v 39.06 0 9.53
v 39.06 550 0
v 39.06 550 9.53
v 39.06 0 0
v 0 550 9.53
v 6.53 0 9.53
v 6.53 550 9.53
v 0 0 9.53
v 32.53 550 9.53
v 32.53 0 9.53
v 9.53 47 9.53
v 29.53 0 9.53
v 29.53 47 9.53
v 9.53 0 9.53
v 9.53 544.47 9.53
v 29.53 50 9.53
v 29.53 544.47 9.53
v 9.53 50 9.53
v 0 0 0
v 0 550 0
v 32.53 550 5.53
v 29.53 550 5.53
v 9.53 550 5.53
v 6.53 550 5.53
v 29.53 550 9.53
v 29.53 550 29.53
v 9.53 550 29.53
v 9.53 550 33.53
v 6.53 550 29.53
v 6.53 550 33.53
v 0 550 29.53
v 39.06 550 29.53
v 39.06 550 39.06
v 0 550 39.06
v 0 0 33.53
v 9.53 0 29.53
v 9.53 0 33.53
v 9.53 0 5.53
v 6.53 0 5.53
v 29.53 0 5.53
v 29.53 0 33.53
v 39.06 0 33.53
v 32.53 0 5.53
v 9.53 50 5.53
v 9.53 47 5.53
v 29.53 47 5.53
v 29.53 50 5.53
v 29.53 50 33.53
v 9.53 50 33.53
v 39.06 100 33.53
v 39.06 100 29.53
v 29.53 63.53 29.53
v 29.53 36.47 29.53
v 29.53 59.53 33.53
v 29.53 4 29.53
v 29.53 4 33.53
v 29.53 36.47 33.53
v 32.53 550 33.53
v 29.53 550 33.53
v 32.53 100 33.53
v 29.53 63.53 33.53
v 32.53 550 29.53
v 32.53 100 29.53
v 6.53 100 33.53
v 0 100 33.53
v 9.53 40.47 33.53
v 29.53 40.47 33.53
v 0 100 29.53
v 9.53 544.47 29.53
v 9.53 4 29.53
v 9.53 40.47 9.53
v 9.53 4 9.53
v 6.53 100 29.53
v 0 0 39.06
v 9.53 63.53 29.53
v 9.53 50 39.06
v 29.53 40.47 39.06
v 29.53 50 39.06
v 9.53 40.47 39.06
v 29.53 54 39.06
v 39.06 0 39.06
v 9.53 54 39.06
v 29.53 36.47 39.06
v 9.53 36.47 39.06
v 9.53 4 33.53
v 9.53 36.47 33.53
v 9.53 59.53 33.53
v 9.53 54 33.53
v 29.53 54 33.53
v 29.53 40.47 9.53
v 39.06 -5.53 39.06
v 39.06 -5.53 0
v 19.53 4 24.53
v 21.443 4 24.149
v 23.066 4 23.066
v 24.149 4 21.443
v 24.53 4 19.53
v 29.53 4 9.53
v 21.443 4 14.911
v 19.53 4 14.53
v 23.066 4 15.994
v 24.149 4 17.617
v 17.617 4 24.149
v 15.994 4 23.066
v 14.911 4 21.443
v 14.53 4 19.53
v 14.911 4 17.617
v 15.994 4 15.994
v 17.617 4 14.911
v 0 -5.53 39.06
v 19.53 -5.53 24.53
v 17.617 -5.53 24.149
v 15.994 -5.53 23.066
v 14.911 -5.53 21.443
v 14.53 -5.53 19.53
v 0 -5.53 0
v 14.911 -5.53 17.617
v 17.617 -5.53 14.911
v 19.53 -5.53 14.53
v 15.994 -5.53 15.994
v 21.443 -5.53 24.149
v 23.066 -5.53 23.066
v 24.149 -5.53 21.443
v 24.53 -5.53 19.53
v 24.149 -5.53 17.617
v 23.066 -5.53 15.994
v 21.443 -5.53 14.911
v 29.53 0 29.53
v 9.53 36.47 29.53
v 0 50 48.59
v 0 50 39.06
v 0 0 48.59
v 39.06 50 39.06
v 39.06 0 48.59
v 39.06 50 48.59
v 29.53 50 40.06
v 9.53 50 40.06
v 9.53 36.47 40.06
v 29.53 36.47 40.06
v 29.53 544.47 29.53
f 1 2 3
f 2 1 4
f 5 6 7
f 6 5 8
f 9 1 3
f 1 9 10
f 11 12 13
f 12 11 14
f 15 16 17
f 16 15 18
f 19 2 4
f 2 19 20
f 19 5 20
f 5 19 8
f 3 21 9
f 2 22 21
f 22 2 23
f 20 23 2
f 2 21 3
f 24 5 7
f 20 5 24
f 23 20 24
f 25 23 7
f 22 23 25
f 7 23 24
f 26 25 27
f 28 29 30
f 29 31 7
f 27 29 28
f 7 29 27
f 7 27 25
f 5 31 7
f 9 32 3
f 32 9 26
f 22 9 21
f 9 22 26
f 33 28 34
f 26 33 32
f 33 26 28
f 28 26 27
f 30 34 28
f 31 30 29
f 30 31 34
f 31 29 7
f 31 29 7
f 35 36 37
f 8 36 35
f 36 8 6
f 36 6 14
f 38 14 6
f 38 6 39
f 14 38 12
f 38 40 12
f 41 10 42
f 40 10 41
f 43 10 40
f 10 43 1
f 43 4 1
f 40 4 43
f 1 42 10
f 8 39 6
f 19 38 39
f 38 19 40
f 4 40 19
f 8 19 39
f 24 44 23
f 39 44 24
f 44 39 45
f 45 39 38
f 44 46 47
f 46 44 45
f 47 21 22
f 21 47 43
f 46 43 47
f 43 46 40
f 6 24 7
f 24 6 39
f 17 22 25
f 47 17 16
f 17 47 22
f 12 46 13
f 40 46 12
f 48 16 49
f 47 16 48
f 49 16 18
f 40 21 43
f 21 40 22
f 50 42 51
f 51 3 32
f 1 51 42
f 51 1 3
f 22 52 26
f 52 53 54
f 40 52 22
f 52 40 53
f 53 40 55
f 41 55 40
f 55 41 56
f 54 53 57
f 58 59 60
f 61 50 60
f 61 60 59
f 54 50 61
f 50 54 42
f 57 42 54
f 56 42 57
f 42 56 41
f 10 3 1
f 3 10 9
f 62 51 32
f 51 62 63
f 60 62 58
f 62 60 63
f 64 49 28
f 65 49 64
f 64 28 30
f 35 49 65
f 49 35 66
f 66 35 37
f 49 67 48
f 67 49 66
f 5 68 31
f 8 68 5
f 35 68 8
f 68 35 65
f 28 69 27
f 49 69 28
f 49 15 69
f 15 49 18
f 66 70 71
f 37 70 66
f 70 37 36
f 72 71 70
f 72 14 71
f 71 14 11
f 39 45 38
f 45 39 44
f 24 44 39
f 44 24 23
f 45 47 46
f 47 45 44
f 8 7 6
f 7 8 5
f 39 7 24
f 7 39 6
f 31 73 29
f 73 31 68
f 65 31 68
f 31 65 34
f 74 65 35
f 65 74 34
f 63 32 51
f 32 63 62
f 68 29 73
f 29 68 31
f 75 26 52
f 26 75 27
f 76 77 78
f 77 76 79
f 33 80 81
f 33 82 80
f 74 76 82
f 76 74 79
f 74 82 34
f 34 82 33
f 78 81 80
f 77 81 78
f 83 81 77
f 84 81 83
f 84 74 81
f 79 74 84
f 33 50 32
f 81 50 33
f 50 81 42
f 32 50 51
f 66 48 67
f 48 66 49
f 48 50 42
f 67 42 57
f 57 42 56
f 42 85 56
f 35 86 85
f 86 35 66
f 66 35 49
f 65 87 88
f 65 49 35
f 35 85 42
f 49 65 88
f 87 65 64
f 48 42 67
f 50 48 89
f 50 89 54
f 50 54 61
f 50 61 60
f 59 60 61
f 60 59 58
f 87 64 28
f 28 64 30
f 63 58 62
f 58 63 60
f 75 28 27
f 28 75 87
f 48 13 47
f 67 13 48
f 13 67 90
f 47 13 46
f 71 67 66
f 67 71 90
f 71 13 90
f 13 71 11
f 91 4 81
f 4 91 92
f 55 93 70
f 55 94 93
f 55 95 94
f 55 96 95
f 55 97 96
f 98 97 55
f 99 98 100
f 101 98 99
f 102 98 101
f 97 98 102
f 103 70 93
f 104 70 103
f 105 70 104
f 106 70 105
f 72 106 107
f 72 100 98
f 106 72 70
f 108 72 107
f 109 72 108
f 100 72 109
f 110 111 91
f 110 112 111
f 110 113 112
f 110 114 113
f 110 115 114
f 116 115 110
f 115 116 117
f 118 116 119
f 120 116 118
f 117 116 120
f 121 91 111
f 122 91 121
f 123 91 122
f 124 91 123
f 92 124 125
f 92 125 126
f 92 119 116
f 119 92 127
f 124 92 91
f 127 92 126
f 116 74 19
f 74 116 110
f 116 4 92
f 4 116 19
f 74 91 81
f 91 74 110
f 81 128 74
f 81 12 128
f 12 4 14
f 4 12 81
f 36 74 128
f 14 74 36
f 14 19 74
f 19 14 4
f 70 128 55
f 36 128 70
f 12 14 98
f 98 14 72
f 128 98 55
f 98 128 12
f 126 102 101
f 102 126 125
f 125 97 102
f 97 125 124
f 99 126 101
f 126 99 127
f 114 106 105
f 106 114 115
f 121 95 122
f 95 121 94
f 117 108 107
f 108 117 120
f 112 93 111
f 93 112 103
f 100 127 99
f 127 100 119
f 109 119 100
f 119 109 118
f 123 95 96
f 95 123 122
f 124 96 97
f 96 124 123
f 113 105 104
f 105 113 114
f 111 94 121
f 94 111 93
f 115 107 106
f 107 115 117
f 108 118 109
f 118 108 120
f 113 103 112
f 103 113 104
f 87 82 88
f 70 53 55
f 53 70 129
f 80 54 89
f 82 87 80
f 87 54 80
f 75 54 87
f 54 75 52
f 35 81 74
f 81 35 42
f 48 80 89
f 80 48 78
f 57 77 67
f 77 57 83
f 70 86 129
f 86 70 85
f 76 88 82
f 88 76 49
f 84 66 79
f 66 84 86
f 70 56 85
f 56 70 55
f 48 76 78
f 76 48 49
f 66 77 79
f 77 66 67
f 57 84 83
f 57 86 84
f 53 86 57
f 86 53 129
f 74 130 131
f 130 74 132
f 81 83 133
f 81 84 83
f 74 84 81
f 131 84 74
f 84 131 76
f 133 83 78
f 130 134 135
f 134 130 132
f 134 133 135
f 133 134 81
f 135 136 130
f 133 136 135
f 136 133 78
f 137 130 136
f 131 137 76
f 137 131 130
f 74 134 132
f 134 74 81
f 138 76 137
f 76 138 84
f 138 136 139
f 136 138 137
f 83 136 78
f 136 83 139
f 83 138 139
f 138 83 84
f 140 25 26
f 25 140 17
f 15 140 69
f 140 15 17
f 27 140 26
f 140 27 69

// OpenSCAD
module pipe_side(stock_thickness=9.53,
                 inner_width=20,
                 pipe_length=500,
                 upper_lip_pipe_length = 50,
                 foot_cavity_height=50,
                 dado_width=3,
                 dado_depth=4,
                 right=false)
 {
    // TODO add screw holes?
    total_height = pipe_length+foot_cavity_height;
    difference() {
        translate([0, 0, 0])
            cube([inner_width+(2*dado_depth),
                  total_height,
                  stock_thickness]);
        translate([right?inner_width+dado_depth:0, 0, dado_width])
            cube([dado_depth,
                  total_height,
                  stock_thickness-dado_width]);
        translate([right?0:inner_width+dado_depth,
                   foot_cavity_height+upper_lip_pipe_length,
                   dado_width])
            cube([dado_depth,
                  total_height-upper_lip_pipe_length-foot_cavity_height,
                  stock_thickness-dado_width]);
    }
}

module pipe_back(stock_thickness=9.53,
                 inner_width=20,
                 pipe_length=500,
                 foot_cavity_height=50,
                 dado_width=3,
                 dado_depth=4)
{
    total_height = pipe_length+foot_cavity_height;
    difference() {
        translate([0, 0, 0])
            cube([inner_width+(2*stock_thickness),
                  total_height,
                  stock_thickness]);
        translate([stock_thickness-dado_width,
                   0,
                   stock_thickness-dado_depth])
            cube([dado_width,
                  total_height,
                  dado_depth]);
        translate([inner_width+stock_thickness,
                   0,
                   stock_thickness-dado_depth])
            cube([dado_width,
                  total_height,
                  dado_depth]);
        // languid dado
        translate([stock_thickness,
                   foot_cavity_height-dado_width,
                   stock_thickness-dado_depth])
            cube([inner_width, dado_width, dado_depth]);
    }
}

module pipe_front(stock_thickness=9.53,
                 inner_width=20,
                 pipe_length=500,
                 upper_lip_pipe_length = 50,
                 foot_cavity_height=50,
                 dado_width=3,
                 dado_depth=4)
{
    difference() {
        cube([inner_width+(2*stock_thickness),
              pipe_length-upper_lip_pipe_length,
              stock_thickness]);
        translate([stock_thickness-dado_width,
                   0,
                   stock_thickness-dado_depth])
            cube([dado_width,
                  pipe_length,
                  dado_depth]);
        translate([inner_width+stock_thickness,
                   0,
                   stock_thickness-dado_depth])
            cube([dado_width,
                  pipe_length,
                  dado_depth]);
    }
}

module languid(stock_thickness=9.53,
               inner_width=20,
               dado_width=3,
               dado_depth=4)
{
    difference() {
        cube([inner_width,
              inner_width+2*dado_depth,
              stock_thickness]);
        translate([0, 0, dado_width])
            cube([inner_width, dado_depth, stock_thickness-dado_width]);
    }
}

module foot_base(stock_thickness=9.53,
                 inner_width=20,
                 dado_depth=4,
                 foot_hole_dia=10)
{
    difference() {
        cube([inner_width+2*stock_thickness,
              inner_width+2*stock_thickness,
              stock_thickness]);
        translate([0, 0, stock_thickness-dado_depth])
            cube([inner_width+2*stock_thickness,
                  stock_thickness,
                  dado_depth]);
        translate([0, inner_width+stock_thickness, stock_thickness-dado_depth])
            cube([inner_width+2*stock_thickness,
                  stock_thickness,
                  dado_depth]);
        translate([stock_thickness, 0, stock_thickness-dado_depth])
            rotate([0, 0, 90])
                cube([inner_width+2*stock_thickness,
                      stock_thickness,
                      dado_depth]);
        translate([2*stock_thickness+inner_width, 0, stock_thickness-dado_depth])
            rotate([0, 0, 90])
                cube([inner_width+2*stock_thickness,
                      stock_thickness,
                      dado_depth]);

        translate([stock_thickness+(inner_width/2),
                   stock_thickness+(inner_width/2),
                   0])
            cylinder(h=stock_thickness, r=foot_hole_dia/2);
    }
}

module wedge(inner_width=10,
             stock_thickness=9.53,
             lip_grade=45,
             dado_depth=4)
{
    difference() {
        union() {
            cube([inner_width,
                  (stock_thickness-dado_depth)*tan(90-lip_grade),
                  stock_thickness]);
            translate([-stock_thickness, 0, stock_thickness-dado_depth])
                cube([inner_width+2*stock_thickness,
                      stock_thickness*tan(90-lip_grade),
                      dado_depth]);
            }
            rotate([lip_grade, 0, 0])
                translate([0, 0, -stock_thickness])
                    cube([inner_width,
                          2*stock_thickness/sin(lip_grade),
                          stock_thickness]);
        }
}

module upper_lip(stock_thickness=9.53,
                 inner_width=20,
                 upper_lip_pipe_length = 50,
                 foot_cavity_height=50,
                 dado_depth=4,
                 air_band_thickness=1,
                 aperature=4,
                 lip_grade=45)
{
    difference() {
        cube([inner_width+2*stock_thickness,
              foot_cavity_height+upper_lip_pipe_length,
              stock_thickness]);
        translate([0, 0, stock_thickness-dado_depth])
            cube([stock_thickness,
                  foot_cavity_height+
                    upper_lip_pipe_length+
                    stock_thickness-dado_depth,
                  dado_depth]);
        translate([stock_thickness+inner_width, 0, stock_thickness-dado_depth])
            cube([stock_thickness,
                  foot_cavity_height+
                    upper_lip_pipe_length+
                    stock_thickness-dado_depth,
                  dado_depth]);
        translate([0, 0, stock_thickness-dado_depth])
            cube([inner_width+2*stock_thickness,
                  dado_depth,
                  dado_depth]);
        // inset for languid
        translate([0,
                   foot_cavity_height-stock_thickness,
                   stock_thickness-dado_depth])
            cube([inner_width+2*stock_thickness,
                  stock_thickness,
                  dado_depth]);
        // aperature
        translate([stock_thickness, foot_cavity_height, 0])
            cube([inner_width, aperature, stock_thickness]);
        // upper lip
        translate([stock_thickness, foot_cavity_height+aperature, 0])
            wedge(inner_width=inner_width,
                  stock_thickness=stock_thickness,
                  dado_depth=dado_depth,
                  lip_grade=lip_grade);
        // channel opening
        translate([stock_thickness,
                   foot_cavity_height-stock_thickness-aperature,
                   0])
            cube([inner_width, aperature, stock_thickness]);
    }
}

module face(stock_thickness=9.53,
            inner_width=20,
            foot_cavity_height=50,
            air_band_thickness=1,
            aperature=4)
{
    difference() {
            cube([inner_width+2*stock_thickness,
                  foot_cavity_height,
                  stock_thickness]);
            translate([stock_thickness,
                       foot_cavity_height-stock_thickness-aperature,
                       stock_thickness-air_band_thickness])
                cube([inner_width,
                      stock_thickness+aperature,
                      air_band_thickness]);
    }
}

module stopper(stock_thickness=9.53,
               inner_width=20,
               dado_width=3,
               dado_depth=4)
{

    cube([inner_width,
          inner_width,
          stock_thickness-dado_depth]);
}

module exploded_view(stock_thickness=9.53,
                     inner_width=20,
                     pipe_length=500,
                     upper_lip_pipe_length = 50,
                     foot_cavity_height=50,
                     dado_width=3,
                     dado_depth=4,
                     foot_hole_dia=10,
                     air_band_thickness=1,
                     aperature=4,
                     lip_grade=45,
                     explode_by=5)
{
        // pipe back
        pipe_back(stock_thickness=stock_thickness,
                  inner_width=inner_width,
                  pipe_length=pipe_length,
                  foot_cavity_height=foot_cavity_height,
                  dado_width=dado_width,
                  dado_depth=dado_depth);

        // pipe side
        translate([stock_thickness+inner_width,
                   0,
                   inner_width+2*dado_depth + stock_thickness-dado_depth + explode_by])
            rotate([0, 90, 0])
                pipe_side(stock_thickness=stock_thickness,
                          inner_width=inner_width,
                          pipe_length=pipe_length,
                          upper_lip_pipe_length=upper_lip_pipe_length,
                          foot_cavity_height=foot_cavity_height,
                          dado_width=dado_width,
                          dado_depth=dado_depth,
                          right=true);

        // pipe side
        translate([stock_thickness,
                   0,
                   stock_thickness-dado_depth + explode_by])
            rotate([0, -90, 0])
                pipe_side(stock_thickness=stock_thickness,
                          inner_width=inner_width,
                          pipe_length=pipe_length,
                          upper_lip_pipe_length=upper_lip_pipe_length,
                          foot_cavity_height=foot_cavity_height,
                          dado_width=dado_width,
                          dado_depth=dado_depth);

        // pipe front
        translate([inner_width+2*stock_thickness,
                   foot_cavity_height+upper_lip_pipe_length,
                   2*stock_thickness
                     + inner_width+2*explode_by])
            rotate([0, 180, 0])
                pipe_front(stock_thickness=stock_thickness,
                           inner_width=inner_width,
                           pipe_length=pipe_length,
                           upper_lip_pipe_length=upper_lip_pipe_length,
                           foot_cavity_height=foot_cavity_height,
                           dado_width=dado_width,
                           dado_depth=dado_depth);

        // languid
        translate([stock_thickness,
                   foot_cavity_height,
                   stock_thickness-dado_depth + explode_by])
            rotate([90, 0, 0])
                languid(stock_thickness=stock_thickness,
                        dado_width=dado_width,
                        dado_depth=dado_depth);

         // foot base
         translate([0,
                    -stock_thickness+dado_depth - explode_by,
                    inner_width+2*stock_thickness + explode_by])
            rotate([270, 0, 0])
                foot_base(stock_thickness=stock_thickness,
                          inner_width=inner_width,
                          dado_depth=dado_depth,
                          foot_hole_dia=foot_hole_dia);
         // upper lip
         translate([inner_width+2*stock_thickness,
                    0,
                    2*stock_thickness+inner_width+3*explode_by])
            rotate([0,180,0])
                upper_lip(stock_thickness=stock_thickness,
                          inner_width=inner_width,
                          upper_lip_pipe_length = upper_lip_pipe_length,
                          foot_cavity_height=foot_cavity_height,
                          dado_depth=dado_depth,
                          air_band_thickness=air_band_thickness,
                          aperature=aperature,
                          lip_grade=lip_grade);
        // face
        translate([inner_width+2*stock_thickness,
                   0,
                   3*stock_thickness+inner_width+4*explode_by])
            rotate([0, 180, 0])
                face(stock_thickness=9.53,
                     inner_width=20,
                     foot_cavity_height=50,
                     air_band_thickness=1,
                     aperature=4);
        // stopper
        translate([stock_thickness,
                   foot_cavity_height+
                     pipe_length+
                     explode_by,
                   explode_by+stock_thickness])
            rotate([90, 0, 0])
                stopper(stock_thickness=stock_thickness,
                        inner_width=inner_width,
                        dado_width=dado_width,
                        dado_depth=dado_depth);

}
exploded_view(explode_by=0);
